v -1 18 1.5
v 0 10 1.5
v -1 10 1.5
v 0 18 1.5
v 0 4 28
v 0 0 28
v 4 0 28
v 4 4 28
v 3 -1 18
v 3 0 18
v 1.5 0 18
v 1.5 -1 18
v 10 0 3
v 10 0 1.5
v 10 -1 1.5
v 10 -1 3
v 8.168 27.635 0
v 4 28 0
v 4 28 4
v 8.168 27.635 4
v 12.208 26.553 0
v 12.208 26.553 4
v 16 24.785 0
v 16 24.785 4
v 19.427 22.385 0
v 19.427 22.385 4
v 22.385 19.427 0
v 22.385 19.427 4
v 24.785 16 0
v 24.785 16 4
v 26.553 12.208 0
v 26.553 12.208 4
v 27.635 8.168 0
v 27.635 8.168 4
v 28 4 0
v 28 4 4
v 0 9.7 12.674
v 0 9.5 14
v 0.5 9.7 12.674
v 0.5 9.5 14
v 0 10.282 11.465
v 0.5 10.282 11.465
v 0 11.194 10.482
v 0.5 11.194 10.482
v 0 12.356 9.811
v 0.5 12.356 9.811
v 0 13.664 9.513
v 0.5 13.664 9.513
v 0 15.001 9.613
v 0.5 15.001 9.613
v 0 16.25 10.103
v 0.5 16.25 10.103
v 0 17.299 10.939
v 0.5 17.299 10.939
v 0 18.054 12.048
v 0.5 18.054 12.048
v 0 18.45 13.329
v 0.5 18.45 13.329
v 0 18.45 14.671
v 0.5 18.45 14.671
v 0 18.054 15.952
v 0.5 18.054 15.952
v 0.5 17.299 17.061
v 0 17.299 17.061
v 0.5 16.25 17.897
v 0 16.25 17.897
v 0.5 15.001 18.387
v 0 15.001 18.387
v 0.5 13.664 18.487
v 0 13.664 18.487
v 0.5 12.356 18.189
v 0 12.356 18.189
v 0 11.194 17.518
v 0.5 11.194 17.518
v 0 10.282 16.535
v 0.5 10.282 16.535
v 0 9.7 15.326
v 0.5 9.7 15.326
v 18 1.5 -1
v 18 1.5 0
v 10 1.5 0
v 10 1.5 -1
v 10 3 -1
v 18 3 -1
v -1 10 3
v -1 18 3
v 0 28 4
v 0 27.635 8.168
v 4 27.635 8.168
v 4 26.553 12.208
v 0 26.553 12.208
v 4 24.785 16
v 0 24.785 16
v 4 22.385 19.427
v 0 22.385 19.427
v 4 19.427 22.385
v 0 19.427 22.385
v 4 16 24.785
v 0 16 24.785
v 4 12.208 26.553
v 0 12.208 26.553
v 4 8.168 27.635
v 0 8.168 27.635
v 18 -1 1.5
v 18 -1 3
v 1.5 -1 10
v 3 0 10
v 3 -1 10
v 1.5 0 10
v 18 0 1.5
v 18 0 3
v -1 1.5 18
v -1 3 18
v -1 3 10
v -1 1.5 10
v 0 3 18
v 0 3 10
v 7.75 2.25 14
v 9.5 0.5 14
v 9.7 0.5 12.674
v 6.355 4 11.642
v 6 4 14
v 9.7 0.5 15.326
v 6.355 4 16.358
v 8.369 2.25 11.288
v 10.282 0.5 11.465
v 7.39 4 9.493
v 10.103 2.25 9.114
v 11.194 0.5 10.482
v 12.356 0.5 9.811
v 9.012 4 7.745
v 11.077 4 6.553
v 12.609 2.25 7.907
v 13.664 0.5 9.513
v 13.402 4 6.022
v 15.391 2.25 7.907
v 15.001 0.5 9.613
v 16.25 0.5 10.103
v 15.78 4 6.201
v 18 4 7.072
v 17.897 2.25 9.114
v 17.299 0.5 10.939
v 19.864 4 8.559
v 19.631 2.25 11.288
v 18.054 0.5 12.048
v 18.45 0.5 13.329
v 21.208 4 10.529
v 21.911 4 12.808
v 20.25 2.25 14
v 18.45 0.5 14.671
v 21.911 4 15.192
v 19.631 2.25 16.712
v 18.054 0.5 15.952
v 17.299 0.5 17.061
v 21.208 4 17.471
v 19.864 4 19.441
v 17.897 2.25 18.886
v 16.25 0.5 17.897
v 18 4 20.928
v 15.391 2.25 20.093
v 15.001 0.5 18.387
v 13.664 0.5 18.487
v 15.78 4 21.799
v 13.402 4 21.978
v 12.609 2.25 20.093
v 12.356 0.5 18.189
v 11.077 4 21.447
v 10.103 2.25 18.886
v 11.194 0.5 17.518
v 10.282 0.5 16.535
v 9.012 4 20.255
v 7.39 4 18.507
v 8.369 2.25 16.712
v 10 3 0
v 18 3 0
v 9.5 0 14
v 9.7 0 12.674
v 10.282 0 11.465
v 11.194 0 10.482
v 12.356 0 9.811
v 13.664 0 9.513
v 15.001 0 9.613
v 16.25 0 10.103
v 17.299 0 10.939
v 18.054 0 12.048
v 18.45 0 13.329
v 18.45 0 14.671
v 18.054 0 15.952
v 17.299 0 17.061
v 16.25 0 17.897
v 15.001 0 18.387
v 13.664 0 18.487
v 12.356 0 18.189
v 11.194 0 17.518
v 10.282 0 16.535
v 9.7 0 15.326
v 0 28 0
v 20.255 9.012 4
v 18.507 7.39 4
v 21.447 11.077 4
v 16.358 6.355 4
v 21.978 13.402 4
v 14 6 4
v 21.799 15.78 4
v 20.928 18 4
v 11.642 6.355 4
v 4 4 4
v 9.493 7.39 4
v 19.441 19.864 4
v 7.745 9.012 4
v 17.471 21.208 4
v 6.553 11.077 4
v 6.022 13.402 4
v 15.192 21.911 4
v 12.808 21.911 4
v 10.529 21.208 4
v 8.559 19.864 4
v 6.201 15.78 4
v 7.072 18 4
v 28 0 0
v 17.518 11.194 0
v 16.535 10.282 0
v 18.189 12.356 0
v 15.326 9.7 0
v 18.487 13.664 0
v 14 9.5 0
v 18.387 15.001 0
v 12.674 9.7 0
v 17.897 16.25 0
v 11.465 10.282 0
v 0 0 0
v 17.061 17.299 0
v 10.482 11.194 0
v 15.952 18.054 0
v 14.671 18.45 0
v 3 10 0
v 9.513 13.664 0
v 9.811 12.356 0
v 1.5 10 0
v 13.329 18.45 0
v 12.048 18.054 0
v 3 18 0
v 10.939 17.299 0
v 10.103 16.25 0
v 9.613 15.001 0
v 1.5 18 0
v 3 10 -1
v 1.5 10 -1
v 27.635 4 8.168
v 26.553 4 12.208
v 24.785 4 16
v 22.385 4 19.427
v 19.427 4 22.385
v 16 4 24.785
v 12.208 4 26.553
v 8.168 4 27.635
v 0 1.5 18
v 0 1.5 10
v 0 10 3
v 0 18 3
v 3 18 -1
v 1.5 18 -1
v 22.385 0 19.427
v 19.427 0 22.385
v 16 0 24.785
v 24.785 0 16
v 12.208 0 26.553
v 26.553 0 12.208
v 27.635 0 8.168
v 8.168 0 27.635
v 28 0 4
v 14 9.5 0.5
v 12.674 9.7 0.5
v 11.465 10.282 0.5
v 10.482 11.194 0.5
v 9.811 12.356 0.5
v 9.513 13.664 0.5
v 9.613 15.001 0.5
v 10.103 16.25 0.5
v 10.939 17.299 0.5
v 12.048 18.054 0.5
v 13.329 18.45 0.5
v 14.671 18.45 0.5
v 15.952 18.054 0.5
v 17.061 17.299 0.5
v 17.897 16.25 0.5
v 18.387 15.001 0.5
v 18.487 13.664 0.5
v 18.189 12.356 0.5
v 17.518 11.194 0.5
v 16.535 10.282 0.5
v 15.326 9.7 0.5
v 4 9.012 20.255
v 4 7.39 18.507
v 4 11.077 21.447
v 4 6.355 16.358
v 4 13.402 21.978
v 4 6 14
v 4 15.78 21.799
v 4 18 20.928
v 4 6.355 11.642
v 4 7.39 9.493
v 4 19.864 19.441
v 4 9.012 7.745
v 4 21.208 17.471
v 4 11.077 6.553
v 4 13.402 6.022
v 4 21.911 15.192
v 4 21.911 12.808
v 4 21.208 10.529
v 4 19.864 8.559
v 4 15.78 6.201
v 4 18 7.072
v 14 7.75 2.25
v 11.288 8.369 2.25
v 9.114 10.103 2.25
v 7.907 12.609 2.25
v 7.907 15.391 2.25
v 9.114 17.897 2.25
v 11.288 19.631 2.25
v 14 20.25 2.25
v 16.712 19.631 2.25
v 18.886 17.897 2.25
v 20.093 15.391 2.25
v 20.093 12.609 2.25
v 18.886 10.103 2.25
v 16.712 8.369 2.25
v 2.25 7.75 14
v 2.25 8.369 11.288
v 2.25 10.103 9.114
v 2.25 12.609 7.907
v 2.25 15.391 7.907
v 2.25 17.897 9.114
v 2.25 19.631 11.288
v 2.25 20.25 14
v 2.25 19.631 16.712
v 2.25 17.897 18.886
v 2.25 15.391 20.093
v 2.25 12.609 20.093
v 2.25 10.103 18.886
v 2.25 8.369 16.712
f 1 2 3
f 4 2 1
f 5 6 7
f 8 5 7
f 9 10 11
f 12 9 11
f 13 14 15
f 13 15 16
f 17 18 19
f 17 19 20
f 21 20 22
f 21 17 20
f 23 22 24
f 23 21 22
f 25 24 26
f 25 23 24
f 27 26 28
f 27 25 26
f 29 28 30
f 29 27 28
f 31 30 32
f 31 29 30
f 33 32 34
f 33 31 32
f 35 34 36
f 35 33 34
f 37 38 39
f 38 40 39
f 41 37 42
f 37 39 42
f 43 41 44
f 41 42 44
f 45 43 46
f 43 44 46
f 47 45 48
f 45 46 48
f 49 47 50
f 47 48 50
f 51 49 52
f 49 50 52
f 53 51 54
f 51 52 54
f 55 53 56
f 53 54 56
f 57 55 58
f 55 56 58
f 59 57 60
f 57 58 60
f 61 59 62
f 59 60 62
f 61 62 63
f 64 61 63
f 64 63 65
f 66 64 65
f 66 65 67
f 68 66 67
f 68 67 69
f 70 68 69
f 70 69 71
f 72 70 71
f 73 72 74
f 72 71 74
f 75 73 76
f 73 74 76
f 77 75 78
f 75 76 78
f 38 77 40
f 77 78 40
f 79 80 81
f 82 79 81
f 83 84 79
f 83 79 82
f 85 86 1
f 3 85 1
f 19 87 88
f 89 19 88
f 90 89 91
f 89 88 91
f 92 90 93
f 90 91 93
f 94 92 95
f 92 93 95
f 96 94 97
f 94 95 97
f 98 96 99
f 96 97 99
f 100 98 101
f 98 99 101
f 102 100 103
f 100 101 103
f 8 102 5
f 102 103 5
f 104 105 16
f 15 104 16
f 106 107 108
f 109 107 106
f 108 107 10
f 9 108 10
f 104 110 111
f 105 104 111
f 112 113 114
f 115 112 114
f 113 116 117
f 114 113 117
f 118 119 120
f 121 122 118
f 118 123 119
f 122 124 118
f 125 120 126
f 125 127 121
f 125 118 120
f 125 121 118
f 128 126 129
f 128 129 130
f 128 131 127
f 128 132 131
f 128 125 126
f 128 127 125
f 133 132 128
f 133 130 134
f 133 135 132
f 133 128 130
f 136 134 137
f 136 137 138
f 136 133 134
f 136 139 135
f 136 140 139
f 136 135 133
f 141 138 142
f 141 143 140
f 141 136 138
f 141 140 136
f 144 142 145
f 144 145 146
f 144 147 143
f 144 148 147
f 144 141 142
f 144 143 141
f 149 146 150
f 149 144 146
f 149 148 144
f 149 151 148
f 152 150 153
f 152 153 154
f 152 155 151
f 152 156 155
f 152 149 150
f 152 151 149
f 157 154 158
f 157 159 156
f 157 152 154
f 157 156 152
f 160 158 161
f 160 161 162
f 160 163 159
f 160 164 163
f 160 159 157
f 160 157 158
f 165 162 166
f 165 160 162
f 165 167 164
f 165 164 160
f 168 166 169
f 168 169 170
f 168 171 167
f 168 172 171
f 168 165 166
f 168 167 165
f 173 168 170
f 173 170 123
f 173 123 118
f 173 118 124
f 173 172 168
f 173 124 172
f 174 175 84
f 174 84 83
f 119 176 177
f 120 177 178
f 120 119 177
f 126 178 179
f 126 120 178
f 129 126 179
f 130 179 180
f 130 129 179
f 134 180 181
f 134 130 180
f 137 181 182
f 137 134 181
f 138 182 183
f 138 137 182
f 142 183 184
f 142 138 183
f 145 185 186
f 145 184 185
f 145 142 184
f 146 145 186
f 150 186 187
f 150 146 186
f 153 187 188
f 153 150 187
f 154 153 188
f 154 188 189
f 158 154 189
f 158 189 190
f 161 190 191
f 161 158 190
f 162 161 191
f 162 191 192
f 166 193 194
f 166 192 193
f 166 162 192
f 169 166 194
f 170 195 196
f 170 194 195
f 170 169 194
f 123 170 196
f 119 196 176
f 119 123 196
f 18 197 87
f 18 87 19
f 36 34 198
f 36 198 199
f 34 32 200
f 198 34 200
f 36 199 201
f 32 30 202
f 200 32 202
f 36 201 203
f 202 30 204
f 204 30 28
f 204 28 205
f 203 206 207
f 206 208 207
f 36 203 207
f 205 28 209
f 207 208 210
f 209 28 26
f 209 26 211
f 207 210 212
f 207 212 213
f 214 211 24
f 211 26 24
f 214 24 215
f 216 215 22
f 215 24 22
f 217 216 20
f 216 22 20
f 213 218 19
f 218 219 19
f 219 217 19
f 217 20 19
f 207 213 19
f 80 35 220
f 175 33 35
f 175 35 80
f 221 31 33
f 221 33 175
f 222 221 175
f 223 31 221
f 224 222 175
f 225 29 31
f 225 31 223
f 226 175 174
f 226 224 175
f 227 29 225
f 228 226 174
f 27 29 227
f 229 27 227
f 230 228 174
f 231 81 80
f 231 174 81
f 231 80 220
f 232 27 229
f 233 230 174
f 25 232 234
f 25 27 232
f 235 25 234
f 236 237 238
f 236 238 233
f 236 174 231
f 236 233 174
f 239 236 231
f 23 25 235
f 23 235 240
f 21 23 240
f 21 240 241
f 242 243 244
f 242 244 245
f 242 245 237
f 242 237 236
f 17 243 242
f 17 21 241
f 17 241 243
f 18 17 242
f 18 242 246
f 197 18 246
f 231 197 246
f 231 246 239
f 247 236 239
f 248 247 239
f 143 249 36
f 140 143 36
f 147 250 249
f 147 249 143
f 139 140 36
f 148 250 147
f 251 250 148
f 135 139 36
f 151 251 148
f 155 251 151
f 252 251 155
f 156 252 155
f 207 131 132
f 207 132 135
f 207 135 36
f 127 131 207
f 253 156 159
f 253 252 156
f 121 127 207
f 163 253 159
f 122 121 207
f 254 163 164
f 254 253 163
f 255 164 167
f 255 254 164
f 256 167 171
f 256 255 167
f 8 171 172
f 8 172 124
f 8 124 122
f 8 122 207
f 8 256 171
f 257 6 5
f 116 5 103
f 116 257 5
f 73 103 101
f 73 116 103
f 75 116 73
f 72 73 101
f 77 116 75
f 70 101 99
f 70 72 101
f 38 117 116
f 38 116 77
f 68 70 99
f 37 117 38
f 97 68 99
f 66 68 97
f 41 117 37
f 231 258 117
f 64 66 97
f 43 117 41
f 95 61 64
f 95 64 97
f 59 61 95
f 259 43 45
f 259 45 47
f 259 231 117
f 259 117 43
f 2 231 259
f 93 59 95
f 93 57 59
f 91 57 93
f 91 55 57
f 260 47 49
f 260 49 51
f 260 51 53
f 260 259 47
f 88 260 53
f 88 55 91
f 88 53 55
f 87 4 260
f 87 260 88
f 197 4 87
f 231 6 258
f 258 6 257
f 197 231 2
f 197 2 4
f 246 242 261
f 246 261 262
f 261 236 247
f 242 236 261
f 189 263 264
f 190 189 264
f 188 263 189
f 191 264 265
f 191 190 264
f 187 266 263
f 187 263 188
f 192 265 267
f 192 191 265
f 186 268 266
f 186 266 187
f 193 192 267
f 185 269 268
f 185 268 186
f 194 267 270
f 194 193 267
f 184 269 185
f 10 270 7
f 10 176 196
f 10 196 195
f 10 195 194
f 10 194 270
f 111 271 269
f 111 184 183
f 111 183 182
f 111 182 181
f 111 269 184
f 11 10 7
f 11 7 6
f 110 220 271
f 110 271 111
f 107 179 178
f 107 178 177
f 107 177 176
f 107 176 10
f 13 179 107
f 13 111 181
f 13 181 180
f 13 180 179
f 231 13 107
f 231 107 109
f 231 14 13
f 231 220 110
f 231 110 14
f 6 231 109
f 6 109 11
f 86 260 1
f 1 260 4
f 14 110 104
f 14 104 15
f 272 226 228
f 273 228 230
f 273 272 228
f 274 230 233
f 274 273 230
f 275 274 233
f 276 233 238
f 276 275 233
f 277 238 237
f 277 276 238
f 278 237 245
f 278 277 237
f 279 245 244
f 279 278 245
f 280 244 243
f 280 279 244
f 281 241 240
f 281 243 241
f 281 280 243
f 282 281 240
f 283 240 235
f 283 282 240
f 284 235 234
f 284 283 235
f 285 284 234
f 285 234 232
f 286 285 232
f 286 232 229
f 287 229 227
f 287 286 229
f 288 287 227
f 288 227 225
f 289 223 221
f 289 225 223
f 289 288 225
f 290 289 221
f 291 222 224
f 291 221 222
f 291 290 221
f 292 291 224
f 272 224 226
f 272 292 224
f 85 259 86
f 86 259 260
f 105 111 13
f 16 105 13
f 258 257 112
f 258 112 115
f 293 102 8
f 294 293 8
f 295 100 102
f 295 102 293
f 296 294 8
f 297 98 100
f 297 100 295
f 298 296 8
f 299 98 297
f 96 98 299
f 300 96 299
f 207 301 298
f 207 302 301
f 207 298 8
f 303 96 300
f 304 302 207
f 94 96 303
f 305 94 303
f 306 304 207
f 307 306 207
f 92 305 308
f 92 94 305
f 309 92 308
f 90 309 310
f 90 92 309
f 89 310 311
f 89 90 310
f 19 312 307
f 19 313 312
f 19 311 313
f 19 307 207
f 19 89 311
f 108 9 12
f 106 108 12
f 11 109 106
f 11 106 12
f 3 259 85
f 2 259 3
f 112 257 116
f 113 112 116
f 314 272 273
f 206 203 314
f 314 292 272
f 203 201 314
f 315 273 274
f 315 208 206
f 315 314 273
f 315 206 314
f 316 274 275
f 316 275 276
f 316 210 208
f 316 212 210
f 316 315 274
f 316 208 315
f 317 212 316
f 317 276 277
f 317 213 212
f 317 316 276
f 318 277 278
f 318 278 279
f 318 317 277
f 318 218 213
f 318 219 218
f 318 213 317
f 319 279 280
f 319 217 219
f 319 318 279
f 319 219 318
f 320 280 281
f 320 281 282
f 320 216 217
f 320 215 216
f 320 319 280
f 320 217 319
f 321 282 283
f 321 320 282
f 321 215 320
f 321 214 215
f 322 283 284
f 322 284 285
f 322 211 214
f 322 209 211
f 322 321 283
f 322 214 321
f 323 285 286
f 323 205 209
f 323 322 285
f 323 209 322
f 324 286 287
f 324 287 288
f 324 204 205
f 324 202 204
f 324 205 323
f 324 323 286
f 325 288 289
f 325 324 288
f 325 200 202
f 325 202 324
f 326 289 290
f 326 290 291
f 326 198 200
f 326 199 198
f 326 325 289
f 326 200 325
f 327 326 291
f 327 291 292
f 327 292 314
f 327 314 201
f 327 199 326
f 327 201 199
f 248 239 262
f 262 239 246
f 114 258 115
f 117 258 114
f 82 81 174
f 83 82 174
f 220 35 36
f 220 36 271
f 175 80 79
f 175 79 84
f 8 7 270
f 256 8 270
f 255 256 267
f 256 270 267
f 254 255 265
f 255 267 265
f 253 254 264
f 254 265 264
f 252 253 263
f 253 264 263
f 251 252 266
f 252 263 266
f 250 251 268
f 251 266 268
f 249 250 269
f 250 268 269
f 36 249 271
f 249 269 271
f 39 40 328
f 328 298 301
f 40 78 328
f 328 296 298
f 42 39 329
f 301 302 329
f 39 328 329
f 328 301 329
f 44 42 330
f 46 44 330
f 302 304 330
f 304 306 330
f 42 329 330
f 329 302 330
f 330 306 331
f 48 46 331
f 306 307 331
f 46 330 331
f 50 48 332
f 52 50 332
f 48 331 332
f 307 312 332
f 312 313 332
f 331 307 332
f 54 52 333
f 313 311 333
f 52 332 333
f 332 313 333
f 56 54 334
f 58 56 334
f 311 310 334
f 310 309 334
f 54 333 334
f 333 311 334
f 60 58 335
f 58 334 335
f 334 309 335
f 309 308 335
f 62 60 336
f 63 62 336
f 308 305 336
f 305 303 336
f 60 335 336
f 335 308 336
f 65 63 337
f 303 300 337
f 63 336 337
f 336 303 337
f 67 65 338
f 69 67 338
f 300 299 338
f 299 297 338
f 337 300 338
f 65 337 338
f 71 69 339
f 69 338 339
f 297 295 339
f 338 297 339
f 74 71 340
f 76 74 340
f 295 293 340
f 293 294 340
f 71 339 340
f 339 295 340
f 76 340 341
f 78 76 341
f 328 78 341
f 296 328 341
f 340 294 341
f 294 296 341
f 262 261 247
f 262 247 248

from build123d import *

# Parameters (mm, degrees)
EXTRUDE_1_DEPTH            = 4
SKETCH_4_W                 = 1.5
SKETCH_4_H                 = 8
SKETCH_4_W_2               = 8
SKETCH_4_H_2               = 1.5
EXTRUDE_2_DEPTH            = 1
MIRROR_2_COPY_1_DEPTH      = 4
MIRROR_2_COPY_3_SKETCH_W   = 1.5
MIRROR_2_COPY_3_SKETCH_H   = 8
MIRROR_2_COPY_3_SKETCH_W_2 = 8
MIRROR_2_COPY_3_SKETCH_H_2 = 1.5
MIRROR_2_COPY_3_DEPTH      = 1


with BuildPart() as part:
    # Эскиз1 → Бобышка-Вытянуть1 (new body)
    with BuildSketch(Plane.XY):
        with BuildLine():
            Line((0, 0), (0, 28))
            Line((0, 28), (4, 28))
            ThreePointArc((4, 28), (20.970562748, 20.970562748), (28, 4))
            Line((28, 4), (28, 0))
            Line((28, 0), (0, 0))
        make_face()
    extrude_1 = extrude(amount=EXTRUDE_1_DEPTH)

    # Эскиз3 → Зенковка для винта с полупотайной головкой M81 (revolve, cut)
    with BuildSketch(Plane(origin=(14, 14, 4), x_dir=(0, -1, 0), z_dir=(1, 0, 0))):
        Polygon((0, 0), (0, 11.953872786), (4.5, 9.25), (4.5, 3.5), (8, 0), align=None)
    hole_wizard_m81 = revolve(axis=Axis((14, 14, 10.35), (0, 0, -1)), mode=Mode.SUBTRACT)

    # Эскиз4 → Бобышка-Вытянуть2 (add)
    with BuildSketch(Plane(origin=(0, 0, 0), x_dir=(-1, 0, 0), z_dir=(0, 0, -1))):
        with Locations((-2.25, 14)):
            Rectangle(SKETCH_4_W, SKETCH_4_H)
        with Locations((-14, 2.25)):
            Rectangle(SKETCH_4_W_2, SKETCH_4_H_2)
    extrude_2 = extrude(amount=EXTRUDE_2_DEPTH)

    # Зеркальное отражение1: Бобышка-Вытянуть1, Зенковка для винта с полупотайной головкой M81, Бобышка-Вытянуть2 across plane
    add(extrude_1.mirror(Plane(origin=(0, 0, 0), x_dir=(0, 0.707106781, 0.707106781), z_dir=(0, -0.707106781, 0.707106781))))
    add(hole_wizard_m81.mirror(Plane(origin=(0, 0, 0), x_dir=(0, 0.707106781, 0.707106781), z_dir=(0, -0.707106781, 0.707106781))), mode=Mode.SUBTRACT)
    add(extrude_2.mirror(Plane(origin=(0, 0, 0), x_dir=(0, 0.707106781, 0.707106781), z_dir=(0, -0.707106781, 0.707106781))))

    # Зеркальное отражение2: Бобышка-Вытянуть1, Зенковка для винта с полупотайной головкой M81, Бобышка-Вытянуть2 across plane
    add(extrude_1.mirror(Plane(origin=(0, 0, 0), x_dir=(0.707106781, 0, 0.707106781), z_dir=(-0.707106781, 0, 0.707106781))))
    add(hole_wizard_m81.mirror(Plane(origin=(0, 0, 0), x_dir=(0.707106781, 0, 0.707106781), z_dir=(-0.707106781, 0, 0.707106781))), mode=Mode.SUBTRACT)
    add(extrude_2.mirror(Plane(origin=(0, 0, 0), x_dir=(0.707106781, 0, 0.707106781), z_dir=(-0.707106781, 0, 0.707106781))))

    # Зеркальное отражение2 copy 1 sketch → Зеркальное отражение2 copy 1 (add)
    with BuildSketch(Plane.ZX):
        with BuildLine():
            Line((0, 0), (0, 28))
            Line((0, 28), (4, 28))
            ThreePointArc((4, 28), (20.970562748, 20.970562748), (28, 4))
            Line((28, 4), (28, 0))
            Line((28, 0), (0, 0))
        make_face()
    extrude(amount=MIRROR_2_COPY_1_DEPTH)

    # Зеркальное отражение2 copy 2 sketch → Зеркальное отражение2 copy 2 (revolve, cut)
    with BuildSketch(Plane(origin=(14, 4, 14), x_dir=(-1, 0, 0), z_dir=(0, 0, 1))):
        Polygon((0, 0), (0, 11.953872786), (4.5, 9.25), (4.5, 3.5), (8, 0), align=None)
    revolve(axis=Axis((14, 10.35, 14), (0, -1, 0)), mode=Mode.SUBTRACT)

    # Зеркальное отражение2 copy 3 sketch → Зеркальное отражение2 copy 3 (add)
    with BuildSketch(Plane(origin=(0, 0, 0), x_dir=(0, 0, -1), z_dir=(0, -1, 0))):
        with Locations((-2.25, 14)):
            Rectangle(MIRROR_2_COPY_3_SKETCH_W, MIRROR_2_COPY_3_SKETCH_H)
        with Locations((-14, 2.25)):
            Rectangle(MIRROR_2_COPY_3_SKETCH_W_2, MIRROR_2_COPY_3_SKETCH_H_2)
    extrude(amount=MIRROR_2_COPY_3_DEPTH)


solid = part.part
